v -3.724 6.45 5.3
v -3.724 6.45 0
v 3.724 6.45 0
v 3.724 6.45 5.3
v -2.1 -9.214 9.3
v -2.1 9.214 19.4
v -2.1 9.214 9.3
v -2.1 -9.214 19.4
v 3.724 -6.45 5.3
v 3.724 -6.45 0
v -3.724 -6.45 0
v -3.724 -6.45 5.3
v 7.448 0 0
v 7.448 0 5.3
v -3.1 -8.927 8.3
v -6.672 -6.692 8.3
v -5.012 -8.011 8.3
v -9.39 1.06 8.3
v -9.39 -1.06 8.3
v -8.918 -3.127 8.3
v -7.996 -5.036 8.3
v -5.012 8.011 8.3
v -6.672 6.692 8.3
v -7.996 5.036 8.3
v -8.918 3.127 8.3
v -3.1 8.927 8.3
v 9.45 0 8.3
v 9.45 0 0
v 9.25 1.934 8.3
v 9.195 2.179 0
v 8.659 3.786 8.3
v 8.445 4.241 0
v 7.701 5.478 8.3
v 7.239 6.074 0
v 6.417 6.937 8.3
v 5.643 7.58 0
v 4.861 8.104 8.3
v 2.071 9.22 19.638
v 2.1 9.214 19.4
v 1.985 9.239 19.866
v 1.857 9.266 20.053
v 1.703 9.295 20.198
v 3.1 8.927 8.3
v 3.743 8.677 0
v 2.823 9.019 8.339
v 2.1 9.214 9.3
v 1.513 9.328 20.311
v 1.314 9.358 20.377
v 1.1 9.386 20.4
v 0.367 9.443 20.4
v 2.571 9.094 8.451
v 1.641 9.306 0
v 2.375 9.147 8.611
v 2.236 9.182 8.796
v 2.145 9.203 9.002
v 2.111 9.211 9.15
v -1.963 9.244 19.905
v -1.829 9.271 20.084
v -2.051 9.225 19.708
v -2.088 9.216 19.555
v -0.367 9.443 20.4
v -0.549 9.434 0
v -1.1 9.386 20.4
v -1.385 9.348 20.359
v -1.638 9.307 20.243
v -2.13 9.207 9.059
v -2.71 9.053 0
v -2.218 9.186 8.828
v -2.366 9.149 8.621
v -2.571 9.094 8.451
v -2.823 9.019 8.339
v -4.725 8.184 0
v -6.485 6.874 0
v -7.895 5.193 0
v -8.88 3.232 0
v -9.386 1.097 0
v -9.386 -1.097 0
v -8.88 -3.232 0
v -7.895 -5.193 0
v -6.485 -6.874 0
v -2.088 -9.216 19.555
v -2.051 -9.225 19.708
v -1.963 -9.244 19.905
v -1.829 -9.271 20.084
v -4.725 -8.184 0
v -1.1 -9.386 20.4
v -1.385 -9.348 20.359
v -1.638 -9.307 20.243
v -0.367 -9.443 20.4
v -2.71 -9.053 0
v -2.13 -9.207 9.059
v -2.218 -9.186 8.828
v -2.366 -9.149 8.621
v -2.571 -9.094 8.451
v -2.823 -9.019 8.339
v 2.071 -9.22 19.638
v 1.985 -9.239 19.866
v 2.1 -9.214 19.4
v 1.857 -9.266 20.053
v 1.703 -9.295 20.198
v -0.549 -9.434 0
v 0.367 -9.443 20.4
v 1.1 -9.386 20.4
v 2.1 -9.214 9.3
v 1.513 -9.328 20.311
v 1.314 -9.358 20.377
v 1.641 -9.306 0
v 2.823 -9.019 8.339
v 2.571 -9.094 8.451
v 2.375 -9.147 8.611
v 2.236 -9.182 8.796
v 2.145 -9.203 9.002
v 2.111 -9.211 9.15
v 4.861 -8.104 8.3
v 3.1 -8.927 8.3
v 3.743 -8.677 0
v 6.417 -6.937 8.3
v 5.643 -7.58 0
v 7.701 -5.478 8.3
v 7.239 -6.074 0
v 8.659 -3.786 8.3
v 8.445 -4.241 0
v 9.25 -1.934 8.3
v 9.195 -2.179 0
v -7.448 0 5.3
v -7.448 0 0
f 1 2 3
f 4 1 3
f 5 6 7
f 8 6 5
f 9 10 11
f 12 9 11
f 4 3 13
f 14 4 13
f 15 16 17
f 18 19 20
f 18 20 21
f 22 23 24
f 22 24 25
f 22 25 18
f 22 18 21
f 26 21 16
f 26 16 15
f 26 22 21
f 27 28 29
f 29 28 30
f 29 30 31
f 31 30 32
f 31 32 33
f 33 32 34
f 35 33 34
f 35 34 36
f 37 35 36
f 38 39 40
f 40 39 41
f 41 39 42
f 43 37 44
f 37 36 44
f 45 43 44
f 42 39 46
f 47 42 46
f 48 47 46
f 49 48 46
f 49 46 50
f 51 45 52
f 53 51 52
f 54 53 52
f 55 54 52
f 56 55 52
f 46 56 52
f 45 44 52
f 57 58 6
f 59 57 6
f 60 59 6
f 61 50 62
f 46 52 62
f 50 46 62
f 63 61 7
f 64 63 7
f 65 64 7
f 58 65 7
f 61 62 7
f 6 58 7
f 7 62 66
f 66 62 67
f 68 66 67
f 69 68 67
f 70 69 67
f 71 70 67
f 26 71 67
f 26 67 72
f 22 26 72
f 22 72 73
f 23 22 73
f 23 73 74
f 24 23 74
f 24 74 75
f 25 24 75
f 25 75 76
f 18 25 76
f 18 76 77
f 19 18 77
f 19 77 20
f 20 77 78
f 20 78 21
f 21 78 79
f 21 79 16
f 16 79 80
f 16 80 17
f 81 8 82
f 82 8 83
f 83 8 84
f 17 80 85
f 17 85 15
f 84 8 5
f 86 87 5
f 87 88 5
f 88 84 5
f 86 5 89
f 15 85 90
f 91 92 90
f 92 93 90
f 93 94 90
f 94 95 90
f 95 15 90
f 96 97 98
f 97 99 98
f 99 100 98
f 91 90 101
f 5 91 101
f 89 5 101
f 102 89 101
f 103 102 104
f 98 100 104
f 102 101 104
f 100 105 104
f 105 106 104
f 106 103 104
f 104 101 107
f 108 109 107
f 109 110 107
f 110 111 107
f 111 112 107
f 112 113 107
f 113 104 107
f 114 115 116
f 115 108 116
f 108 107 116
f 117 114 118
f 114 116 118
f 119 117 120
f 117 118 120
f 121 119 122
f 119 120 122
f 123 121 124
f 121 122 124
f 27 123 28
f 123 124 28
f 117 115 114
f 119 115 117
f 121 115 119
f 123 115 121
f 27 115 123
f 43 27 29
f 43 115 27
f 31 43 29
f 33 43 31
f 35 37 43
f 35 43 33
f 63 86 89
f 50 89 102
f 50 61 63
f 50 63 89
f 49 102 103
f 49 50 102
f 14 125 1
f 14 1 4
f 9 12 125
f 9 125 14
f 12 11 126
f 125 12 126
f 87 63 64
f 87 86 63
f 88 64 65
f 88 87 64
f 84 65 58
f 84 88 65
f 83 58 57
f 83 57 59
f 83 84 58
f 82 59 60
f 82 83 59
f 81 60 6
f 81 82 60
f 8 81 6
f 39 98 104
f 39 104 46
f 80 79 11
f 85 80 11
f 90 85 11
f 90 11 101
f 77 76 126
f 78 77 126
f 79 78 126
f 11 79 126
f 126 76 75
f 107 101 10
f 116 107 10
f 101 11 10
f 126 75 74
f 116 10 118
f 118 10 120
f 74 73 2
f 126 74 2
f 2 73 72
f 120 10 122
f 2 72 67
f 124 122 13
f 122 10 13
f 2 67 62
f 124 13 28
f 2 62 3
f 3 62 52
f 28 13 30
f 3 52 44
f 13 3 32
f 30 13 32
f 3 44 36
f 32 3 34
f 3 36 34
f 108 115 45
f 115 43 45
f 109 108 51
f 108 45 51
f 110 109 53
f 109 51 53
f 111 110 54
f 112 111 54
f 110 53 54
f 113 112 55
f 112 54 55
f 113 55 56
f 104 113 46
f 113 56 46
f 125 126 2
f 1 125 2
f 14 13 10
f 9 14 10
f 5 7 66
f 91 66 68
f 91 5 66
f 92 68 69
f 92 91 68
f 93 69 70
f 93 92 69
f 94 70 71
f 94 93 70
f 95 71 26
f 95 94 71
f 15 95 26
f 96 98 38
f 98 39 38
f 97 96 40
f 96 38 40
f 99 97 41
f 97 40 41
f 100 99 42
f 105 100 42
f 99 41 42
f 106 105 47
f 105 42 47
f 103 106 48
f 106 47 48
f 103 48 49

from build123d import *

# Parameters (mm, degrees)
SKETCH_R        = 9.45
PAD_DEPTH       = 20.4
POCKET_DEPTH    = 12.1
FILLET_R        = 1
POCKET001_DEPTH = 5.3


with BuildPart() as part:
    # Sketch → Pad (new body)
    with BuildSketch(Plane.XY):
        Circle(SKETCH_R)
    extrude(amount=PAD_DEPTH)

    # Sketch001 (on Face3 of Pad) → Pocket (cut)
    with BuildSketch(Plane.XY.offset(20.4)):
        with BuildLine():
            ThreePointArc((-2.100006, 9.213711), (-9.45, 0), (-2.100006, -9.213711))
            Line((-2.100006, 9.213711), (-2.100006, -9.213711))
        make_face()
        with BuildLine():
            ThreePointArc((2.099994, -9.213714), (9.45, 0), (2.099994, 9.213714))
            Line((2.099994, -9.213714), (2.099994, 9.213714))
        make_face()
    extrude(amount=-POCKET_DEPTH, mode=Mode.SUBTRACT)

    # Fillet
    fillet_edges = [part.edges().sort_by_distance(p)[0] for p in [
        (2.099994, 0, 20.4),
        (-2.100006, 0, 20.4),
        (2.099994, 0, 8.3),
        (-2.100006, 0, 8.3),
    ]]
    fillet(fillet_edges, radius=FILLET_R)

    # Sketch002 (on Face5 of Fillet) → Pocket001 (cut)
    with BuildSketch(Plane(origin=(0, 0, 0), x_dir=(1, 0, 0), z_dir=(0, 0, -1))):
        Polygon((-3.723909, 6.45), (-7.447818, 0), (-3.723909, -6.45), (3.723909, -6.45), (7.447818, 0), (3.723909, 6.45), align=None)
    extrude(amount=-POCKET001_DEPTH, mode=Mode.SUBTRACT)


solid = part.part
